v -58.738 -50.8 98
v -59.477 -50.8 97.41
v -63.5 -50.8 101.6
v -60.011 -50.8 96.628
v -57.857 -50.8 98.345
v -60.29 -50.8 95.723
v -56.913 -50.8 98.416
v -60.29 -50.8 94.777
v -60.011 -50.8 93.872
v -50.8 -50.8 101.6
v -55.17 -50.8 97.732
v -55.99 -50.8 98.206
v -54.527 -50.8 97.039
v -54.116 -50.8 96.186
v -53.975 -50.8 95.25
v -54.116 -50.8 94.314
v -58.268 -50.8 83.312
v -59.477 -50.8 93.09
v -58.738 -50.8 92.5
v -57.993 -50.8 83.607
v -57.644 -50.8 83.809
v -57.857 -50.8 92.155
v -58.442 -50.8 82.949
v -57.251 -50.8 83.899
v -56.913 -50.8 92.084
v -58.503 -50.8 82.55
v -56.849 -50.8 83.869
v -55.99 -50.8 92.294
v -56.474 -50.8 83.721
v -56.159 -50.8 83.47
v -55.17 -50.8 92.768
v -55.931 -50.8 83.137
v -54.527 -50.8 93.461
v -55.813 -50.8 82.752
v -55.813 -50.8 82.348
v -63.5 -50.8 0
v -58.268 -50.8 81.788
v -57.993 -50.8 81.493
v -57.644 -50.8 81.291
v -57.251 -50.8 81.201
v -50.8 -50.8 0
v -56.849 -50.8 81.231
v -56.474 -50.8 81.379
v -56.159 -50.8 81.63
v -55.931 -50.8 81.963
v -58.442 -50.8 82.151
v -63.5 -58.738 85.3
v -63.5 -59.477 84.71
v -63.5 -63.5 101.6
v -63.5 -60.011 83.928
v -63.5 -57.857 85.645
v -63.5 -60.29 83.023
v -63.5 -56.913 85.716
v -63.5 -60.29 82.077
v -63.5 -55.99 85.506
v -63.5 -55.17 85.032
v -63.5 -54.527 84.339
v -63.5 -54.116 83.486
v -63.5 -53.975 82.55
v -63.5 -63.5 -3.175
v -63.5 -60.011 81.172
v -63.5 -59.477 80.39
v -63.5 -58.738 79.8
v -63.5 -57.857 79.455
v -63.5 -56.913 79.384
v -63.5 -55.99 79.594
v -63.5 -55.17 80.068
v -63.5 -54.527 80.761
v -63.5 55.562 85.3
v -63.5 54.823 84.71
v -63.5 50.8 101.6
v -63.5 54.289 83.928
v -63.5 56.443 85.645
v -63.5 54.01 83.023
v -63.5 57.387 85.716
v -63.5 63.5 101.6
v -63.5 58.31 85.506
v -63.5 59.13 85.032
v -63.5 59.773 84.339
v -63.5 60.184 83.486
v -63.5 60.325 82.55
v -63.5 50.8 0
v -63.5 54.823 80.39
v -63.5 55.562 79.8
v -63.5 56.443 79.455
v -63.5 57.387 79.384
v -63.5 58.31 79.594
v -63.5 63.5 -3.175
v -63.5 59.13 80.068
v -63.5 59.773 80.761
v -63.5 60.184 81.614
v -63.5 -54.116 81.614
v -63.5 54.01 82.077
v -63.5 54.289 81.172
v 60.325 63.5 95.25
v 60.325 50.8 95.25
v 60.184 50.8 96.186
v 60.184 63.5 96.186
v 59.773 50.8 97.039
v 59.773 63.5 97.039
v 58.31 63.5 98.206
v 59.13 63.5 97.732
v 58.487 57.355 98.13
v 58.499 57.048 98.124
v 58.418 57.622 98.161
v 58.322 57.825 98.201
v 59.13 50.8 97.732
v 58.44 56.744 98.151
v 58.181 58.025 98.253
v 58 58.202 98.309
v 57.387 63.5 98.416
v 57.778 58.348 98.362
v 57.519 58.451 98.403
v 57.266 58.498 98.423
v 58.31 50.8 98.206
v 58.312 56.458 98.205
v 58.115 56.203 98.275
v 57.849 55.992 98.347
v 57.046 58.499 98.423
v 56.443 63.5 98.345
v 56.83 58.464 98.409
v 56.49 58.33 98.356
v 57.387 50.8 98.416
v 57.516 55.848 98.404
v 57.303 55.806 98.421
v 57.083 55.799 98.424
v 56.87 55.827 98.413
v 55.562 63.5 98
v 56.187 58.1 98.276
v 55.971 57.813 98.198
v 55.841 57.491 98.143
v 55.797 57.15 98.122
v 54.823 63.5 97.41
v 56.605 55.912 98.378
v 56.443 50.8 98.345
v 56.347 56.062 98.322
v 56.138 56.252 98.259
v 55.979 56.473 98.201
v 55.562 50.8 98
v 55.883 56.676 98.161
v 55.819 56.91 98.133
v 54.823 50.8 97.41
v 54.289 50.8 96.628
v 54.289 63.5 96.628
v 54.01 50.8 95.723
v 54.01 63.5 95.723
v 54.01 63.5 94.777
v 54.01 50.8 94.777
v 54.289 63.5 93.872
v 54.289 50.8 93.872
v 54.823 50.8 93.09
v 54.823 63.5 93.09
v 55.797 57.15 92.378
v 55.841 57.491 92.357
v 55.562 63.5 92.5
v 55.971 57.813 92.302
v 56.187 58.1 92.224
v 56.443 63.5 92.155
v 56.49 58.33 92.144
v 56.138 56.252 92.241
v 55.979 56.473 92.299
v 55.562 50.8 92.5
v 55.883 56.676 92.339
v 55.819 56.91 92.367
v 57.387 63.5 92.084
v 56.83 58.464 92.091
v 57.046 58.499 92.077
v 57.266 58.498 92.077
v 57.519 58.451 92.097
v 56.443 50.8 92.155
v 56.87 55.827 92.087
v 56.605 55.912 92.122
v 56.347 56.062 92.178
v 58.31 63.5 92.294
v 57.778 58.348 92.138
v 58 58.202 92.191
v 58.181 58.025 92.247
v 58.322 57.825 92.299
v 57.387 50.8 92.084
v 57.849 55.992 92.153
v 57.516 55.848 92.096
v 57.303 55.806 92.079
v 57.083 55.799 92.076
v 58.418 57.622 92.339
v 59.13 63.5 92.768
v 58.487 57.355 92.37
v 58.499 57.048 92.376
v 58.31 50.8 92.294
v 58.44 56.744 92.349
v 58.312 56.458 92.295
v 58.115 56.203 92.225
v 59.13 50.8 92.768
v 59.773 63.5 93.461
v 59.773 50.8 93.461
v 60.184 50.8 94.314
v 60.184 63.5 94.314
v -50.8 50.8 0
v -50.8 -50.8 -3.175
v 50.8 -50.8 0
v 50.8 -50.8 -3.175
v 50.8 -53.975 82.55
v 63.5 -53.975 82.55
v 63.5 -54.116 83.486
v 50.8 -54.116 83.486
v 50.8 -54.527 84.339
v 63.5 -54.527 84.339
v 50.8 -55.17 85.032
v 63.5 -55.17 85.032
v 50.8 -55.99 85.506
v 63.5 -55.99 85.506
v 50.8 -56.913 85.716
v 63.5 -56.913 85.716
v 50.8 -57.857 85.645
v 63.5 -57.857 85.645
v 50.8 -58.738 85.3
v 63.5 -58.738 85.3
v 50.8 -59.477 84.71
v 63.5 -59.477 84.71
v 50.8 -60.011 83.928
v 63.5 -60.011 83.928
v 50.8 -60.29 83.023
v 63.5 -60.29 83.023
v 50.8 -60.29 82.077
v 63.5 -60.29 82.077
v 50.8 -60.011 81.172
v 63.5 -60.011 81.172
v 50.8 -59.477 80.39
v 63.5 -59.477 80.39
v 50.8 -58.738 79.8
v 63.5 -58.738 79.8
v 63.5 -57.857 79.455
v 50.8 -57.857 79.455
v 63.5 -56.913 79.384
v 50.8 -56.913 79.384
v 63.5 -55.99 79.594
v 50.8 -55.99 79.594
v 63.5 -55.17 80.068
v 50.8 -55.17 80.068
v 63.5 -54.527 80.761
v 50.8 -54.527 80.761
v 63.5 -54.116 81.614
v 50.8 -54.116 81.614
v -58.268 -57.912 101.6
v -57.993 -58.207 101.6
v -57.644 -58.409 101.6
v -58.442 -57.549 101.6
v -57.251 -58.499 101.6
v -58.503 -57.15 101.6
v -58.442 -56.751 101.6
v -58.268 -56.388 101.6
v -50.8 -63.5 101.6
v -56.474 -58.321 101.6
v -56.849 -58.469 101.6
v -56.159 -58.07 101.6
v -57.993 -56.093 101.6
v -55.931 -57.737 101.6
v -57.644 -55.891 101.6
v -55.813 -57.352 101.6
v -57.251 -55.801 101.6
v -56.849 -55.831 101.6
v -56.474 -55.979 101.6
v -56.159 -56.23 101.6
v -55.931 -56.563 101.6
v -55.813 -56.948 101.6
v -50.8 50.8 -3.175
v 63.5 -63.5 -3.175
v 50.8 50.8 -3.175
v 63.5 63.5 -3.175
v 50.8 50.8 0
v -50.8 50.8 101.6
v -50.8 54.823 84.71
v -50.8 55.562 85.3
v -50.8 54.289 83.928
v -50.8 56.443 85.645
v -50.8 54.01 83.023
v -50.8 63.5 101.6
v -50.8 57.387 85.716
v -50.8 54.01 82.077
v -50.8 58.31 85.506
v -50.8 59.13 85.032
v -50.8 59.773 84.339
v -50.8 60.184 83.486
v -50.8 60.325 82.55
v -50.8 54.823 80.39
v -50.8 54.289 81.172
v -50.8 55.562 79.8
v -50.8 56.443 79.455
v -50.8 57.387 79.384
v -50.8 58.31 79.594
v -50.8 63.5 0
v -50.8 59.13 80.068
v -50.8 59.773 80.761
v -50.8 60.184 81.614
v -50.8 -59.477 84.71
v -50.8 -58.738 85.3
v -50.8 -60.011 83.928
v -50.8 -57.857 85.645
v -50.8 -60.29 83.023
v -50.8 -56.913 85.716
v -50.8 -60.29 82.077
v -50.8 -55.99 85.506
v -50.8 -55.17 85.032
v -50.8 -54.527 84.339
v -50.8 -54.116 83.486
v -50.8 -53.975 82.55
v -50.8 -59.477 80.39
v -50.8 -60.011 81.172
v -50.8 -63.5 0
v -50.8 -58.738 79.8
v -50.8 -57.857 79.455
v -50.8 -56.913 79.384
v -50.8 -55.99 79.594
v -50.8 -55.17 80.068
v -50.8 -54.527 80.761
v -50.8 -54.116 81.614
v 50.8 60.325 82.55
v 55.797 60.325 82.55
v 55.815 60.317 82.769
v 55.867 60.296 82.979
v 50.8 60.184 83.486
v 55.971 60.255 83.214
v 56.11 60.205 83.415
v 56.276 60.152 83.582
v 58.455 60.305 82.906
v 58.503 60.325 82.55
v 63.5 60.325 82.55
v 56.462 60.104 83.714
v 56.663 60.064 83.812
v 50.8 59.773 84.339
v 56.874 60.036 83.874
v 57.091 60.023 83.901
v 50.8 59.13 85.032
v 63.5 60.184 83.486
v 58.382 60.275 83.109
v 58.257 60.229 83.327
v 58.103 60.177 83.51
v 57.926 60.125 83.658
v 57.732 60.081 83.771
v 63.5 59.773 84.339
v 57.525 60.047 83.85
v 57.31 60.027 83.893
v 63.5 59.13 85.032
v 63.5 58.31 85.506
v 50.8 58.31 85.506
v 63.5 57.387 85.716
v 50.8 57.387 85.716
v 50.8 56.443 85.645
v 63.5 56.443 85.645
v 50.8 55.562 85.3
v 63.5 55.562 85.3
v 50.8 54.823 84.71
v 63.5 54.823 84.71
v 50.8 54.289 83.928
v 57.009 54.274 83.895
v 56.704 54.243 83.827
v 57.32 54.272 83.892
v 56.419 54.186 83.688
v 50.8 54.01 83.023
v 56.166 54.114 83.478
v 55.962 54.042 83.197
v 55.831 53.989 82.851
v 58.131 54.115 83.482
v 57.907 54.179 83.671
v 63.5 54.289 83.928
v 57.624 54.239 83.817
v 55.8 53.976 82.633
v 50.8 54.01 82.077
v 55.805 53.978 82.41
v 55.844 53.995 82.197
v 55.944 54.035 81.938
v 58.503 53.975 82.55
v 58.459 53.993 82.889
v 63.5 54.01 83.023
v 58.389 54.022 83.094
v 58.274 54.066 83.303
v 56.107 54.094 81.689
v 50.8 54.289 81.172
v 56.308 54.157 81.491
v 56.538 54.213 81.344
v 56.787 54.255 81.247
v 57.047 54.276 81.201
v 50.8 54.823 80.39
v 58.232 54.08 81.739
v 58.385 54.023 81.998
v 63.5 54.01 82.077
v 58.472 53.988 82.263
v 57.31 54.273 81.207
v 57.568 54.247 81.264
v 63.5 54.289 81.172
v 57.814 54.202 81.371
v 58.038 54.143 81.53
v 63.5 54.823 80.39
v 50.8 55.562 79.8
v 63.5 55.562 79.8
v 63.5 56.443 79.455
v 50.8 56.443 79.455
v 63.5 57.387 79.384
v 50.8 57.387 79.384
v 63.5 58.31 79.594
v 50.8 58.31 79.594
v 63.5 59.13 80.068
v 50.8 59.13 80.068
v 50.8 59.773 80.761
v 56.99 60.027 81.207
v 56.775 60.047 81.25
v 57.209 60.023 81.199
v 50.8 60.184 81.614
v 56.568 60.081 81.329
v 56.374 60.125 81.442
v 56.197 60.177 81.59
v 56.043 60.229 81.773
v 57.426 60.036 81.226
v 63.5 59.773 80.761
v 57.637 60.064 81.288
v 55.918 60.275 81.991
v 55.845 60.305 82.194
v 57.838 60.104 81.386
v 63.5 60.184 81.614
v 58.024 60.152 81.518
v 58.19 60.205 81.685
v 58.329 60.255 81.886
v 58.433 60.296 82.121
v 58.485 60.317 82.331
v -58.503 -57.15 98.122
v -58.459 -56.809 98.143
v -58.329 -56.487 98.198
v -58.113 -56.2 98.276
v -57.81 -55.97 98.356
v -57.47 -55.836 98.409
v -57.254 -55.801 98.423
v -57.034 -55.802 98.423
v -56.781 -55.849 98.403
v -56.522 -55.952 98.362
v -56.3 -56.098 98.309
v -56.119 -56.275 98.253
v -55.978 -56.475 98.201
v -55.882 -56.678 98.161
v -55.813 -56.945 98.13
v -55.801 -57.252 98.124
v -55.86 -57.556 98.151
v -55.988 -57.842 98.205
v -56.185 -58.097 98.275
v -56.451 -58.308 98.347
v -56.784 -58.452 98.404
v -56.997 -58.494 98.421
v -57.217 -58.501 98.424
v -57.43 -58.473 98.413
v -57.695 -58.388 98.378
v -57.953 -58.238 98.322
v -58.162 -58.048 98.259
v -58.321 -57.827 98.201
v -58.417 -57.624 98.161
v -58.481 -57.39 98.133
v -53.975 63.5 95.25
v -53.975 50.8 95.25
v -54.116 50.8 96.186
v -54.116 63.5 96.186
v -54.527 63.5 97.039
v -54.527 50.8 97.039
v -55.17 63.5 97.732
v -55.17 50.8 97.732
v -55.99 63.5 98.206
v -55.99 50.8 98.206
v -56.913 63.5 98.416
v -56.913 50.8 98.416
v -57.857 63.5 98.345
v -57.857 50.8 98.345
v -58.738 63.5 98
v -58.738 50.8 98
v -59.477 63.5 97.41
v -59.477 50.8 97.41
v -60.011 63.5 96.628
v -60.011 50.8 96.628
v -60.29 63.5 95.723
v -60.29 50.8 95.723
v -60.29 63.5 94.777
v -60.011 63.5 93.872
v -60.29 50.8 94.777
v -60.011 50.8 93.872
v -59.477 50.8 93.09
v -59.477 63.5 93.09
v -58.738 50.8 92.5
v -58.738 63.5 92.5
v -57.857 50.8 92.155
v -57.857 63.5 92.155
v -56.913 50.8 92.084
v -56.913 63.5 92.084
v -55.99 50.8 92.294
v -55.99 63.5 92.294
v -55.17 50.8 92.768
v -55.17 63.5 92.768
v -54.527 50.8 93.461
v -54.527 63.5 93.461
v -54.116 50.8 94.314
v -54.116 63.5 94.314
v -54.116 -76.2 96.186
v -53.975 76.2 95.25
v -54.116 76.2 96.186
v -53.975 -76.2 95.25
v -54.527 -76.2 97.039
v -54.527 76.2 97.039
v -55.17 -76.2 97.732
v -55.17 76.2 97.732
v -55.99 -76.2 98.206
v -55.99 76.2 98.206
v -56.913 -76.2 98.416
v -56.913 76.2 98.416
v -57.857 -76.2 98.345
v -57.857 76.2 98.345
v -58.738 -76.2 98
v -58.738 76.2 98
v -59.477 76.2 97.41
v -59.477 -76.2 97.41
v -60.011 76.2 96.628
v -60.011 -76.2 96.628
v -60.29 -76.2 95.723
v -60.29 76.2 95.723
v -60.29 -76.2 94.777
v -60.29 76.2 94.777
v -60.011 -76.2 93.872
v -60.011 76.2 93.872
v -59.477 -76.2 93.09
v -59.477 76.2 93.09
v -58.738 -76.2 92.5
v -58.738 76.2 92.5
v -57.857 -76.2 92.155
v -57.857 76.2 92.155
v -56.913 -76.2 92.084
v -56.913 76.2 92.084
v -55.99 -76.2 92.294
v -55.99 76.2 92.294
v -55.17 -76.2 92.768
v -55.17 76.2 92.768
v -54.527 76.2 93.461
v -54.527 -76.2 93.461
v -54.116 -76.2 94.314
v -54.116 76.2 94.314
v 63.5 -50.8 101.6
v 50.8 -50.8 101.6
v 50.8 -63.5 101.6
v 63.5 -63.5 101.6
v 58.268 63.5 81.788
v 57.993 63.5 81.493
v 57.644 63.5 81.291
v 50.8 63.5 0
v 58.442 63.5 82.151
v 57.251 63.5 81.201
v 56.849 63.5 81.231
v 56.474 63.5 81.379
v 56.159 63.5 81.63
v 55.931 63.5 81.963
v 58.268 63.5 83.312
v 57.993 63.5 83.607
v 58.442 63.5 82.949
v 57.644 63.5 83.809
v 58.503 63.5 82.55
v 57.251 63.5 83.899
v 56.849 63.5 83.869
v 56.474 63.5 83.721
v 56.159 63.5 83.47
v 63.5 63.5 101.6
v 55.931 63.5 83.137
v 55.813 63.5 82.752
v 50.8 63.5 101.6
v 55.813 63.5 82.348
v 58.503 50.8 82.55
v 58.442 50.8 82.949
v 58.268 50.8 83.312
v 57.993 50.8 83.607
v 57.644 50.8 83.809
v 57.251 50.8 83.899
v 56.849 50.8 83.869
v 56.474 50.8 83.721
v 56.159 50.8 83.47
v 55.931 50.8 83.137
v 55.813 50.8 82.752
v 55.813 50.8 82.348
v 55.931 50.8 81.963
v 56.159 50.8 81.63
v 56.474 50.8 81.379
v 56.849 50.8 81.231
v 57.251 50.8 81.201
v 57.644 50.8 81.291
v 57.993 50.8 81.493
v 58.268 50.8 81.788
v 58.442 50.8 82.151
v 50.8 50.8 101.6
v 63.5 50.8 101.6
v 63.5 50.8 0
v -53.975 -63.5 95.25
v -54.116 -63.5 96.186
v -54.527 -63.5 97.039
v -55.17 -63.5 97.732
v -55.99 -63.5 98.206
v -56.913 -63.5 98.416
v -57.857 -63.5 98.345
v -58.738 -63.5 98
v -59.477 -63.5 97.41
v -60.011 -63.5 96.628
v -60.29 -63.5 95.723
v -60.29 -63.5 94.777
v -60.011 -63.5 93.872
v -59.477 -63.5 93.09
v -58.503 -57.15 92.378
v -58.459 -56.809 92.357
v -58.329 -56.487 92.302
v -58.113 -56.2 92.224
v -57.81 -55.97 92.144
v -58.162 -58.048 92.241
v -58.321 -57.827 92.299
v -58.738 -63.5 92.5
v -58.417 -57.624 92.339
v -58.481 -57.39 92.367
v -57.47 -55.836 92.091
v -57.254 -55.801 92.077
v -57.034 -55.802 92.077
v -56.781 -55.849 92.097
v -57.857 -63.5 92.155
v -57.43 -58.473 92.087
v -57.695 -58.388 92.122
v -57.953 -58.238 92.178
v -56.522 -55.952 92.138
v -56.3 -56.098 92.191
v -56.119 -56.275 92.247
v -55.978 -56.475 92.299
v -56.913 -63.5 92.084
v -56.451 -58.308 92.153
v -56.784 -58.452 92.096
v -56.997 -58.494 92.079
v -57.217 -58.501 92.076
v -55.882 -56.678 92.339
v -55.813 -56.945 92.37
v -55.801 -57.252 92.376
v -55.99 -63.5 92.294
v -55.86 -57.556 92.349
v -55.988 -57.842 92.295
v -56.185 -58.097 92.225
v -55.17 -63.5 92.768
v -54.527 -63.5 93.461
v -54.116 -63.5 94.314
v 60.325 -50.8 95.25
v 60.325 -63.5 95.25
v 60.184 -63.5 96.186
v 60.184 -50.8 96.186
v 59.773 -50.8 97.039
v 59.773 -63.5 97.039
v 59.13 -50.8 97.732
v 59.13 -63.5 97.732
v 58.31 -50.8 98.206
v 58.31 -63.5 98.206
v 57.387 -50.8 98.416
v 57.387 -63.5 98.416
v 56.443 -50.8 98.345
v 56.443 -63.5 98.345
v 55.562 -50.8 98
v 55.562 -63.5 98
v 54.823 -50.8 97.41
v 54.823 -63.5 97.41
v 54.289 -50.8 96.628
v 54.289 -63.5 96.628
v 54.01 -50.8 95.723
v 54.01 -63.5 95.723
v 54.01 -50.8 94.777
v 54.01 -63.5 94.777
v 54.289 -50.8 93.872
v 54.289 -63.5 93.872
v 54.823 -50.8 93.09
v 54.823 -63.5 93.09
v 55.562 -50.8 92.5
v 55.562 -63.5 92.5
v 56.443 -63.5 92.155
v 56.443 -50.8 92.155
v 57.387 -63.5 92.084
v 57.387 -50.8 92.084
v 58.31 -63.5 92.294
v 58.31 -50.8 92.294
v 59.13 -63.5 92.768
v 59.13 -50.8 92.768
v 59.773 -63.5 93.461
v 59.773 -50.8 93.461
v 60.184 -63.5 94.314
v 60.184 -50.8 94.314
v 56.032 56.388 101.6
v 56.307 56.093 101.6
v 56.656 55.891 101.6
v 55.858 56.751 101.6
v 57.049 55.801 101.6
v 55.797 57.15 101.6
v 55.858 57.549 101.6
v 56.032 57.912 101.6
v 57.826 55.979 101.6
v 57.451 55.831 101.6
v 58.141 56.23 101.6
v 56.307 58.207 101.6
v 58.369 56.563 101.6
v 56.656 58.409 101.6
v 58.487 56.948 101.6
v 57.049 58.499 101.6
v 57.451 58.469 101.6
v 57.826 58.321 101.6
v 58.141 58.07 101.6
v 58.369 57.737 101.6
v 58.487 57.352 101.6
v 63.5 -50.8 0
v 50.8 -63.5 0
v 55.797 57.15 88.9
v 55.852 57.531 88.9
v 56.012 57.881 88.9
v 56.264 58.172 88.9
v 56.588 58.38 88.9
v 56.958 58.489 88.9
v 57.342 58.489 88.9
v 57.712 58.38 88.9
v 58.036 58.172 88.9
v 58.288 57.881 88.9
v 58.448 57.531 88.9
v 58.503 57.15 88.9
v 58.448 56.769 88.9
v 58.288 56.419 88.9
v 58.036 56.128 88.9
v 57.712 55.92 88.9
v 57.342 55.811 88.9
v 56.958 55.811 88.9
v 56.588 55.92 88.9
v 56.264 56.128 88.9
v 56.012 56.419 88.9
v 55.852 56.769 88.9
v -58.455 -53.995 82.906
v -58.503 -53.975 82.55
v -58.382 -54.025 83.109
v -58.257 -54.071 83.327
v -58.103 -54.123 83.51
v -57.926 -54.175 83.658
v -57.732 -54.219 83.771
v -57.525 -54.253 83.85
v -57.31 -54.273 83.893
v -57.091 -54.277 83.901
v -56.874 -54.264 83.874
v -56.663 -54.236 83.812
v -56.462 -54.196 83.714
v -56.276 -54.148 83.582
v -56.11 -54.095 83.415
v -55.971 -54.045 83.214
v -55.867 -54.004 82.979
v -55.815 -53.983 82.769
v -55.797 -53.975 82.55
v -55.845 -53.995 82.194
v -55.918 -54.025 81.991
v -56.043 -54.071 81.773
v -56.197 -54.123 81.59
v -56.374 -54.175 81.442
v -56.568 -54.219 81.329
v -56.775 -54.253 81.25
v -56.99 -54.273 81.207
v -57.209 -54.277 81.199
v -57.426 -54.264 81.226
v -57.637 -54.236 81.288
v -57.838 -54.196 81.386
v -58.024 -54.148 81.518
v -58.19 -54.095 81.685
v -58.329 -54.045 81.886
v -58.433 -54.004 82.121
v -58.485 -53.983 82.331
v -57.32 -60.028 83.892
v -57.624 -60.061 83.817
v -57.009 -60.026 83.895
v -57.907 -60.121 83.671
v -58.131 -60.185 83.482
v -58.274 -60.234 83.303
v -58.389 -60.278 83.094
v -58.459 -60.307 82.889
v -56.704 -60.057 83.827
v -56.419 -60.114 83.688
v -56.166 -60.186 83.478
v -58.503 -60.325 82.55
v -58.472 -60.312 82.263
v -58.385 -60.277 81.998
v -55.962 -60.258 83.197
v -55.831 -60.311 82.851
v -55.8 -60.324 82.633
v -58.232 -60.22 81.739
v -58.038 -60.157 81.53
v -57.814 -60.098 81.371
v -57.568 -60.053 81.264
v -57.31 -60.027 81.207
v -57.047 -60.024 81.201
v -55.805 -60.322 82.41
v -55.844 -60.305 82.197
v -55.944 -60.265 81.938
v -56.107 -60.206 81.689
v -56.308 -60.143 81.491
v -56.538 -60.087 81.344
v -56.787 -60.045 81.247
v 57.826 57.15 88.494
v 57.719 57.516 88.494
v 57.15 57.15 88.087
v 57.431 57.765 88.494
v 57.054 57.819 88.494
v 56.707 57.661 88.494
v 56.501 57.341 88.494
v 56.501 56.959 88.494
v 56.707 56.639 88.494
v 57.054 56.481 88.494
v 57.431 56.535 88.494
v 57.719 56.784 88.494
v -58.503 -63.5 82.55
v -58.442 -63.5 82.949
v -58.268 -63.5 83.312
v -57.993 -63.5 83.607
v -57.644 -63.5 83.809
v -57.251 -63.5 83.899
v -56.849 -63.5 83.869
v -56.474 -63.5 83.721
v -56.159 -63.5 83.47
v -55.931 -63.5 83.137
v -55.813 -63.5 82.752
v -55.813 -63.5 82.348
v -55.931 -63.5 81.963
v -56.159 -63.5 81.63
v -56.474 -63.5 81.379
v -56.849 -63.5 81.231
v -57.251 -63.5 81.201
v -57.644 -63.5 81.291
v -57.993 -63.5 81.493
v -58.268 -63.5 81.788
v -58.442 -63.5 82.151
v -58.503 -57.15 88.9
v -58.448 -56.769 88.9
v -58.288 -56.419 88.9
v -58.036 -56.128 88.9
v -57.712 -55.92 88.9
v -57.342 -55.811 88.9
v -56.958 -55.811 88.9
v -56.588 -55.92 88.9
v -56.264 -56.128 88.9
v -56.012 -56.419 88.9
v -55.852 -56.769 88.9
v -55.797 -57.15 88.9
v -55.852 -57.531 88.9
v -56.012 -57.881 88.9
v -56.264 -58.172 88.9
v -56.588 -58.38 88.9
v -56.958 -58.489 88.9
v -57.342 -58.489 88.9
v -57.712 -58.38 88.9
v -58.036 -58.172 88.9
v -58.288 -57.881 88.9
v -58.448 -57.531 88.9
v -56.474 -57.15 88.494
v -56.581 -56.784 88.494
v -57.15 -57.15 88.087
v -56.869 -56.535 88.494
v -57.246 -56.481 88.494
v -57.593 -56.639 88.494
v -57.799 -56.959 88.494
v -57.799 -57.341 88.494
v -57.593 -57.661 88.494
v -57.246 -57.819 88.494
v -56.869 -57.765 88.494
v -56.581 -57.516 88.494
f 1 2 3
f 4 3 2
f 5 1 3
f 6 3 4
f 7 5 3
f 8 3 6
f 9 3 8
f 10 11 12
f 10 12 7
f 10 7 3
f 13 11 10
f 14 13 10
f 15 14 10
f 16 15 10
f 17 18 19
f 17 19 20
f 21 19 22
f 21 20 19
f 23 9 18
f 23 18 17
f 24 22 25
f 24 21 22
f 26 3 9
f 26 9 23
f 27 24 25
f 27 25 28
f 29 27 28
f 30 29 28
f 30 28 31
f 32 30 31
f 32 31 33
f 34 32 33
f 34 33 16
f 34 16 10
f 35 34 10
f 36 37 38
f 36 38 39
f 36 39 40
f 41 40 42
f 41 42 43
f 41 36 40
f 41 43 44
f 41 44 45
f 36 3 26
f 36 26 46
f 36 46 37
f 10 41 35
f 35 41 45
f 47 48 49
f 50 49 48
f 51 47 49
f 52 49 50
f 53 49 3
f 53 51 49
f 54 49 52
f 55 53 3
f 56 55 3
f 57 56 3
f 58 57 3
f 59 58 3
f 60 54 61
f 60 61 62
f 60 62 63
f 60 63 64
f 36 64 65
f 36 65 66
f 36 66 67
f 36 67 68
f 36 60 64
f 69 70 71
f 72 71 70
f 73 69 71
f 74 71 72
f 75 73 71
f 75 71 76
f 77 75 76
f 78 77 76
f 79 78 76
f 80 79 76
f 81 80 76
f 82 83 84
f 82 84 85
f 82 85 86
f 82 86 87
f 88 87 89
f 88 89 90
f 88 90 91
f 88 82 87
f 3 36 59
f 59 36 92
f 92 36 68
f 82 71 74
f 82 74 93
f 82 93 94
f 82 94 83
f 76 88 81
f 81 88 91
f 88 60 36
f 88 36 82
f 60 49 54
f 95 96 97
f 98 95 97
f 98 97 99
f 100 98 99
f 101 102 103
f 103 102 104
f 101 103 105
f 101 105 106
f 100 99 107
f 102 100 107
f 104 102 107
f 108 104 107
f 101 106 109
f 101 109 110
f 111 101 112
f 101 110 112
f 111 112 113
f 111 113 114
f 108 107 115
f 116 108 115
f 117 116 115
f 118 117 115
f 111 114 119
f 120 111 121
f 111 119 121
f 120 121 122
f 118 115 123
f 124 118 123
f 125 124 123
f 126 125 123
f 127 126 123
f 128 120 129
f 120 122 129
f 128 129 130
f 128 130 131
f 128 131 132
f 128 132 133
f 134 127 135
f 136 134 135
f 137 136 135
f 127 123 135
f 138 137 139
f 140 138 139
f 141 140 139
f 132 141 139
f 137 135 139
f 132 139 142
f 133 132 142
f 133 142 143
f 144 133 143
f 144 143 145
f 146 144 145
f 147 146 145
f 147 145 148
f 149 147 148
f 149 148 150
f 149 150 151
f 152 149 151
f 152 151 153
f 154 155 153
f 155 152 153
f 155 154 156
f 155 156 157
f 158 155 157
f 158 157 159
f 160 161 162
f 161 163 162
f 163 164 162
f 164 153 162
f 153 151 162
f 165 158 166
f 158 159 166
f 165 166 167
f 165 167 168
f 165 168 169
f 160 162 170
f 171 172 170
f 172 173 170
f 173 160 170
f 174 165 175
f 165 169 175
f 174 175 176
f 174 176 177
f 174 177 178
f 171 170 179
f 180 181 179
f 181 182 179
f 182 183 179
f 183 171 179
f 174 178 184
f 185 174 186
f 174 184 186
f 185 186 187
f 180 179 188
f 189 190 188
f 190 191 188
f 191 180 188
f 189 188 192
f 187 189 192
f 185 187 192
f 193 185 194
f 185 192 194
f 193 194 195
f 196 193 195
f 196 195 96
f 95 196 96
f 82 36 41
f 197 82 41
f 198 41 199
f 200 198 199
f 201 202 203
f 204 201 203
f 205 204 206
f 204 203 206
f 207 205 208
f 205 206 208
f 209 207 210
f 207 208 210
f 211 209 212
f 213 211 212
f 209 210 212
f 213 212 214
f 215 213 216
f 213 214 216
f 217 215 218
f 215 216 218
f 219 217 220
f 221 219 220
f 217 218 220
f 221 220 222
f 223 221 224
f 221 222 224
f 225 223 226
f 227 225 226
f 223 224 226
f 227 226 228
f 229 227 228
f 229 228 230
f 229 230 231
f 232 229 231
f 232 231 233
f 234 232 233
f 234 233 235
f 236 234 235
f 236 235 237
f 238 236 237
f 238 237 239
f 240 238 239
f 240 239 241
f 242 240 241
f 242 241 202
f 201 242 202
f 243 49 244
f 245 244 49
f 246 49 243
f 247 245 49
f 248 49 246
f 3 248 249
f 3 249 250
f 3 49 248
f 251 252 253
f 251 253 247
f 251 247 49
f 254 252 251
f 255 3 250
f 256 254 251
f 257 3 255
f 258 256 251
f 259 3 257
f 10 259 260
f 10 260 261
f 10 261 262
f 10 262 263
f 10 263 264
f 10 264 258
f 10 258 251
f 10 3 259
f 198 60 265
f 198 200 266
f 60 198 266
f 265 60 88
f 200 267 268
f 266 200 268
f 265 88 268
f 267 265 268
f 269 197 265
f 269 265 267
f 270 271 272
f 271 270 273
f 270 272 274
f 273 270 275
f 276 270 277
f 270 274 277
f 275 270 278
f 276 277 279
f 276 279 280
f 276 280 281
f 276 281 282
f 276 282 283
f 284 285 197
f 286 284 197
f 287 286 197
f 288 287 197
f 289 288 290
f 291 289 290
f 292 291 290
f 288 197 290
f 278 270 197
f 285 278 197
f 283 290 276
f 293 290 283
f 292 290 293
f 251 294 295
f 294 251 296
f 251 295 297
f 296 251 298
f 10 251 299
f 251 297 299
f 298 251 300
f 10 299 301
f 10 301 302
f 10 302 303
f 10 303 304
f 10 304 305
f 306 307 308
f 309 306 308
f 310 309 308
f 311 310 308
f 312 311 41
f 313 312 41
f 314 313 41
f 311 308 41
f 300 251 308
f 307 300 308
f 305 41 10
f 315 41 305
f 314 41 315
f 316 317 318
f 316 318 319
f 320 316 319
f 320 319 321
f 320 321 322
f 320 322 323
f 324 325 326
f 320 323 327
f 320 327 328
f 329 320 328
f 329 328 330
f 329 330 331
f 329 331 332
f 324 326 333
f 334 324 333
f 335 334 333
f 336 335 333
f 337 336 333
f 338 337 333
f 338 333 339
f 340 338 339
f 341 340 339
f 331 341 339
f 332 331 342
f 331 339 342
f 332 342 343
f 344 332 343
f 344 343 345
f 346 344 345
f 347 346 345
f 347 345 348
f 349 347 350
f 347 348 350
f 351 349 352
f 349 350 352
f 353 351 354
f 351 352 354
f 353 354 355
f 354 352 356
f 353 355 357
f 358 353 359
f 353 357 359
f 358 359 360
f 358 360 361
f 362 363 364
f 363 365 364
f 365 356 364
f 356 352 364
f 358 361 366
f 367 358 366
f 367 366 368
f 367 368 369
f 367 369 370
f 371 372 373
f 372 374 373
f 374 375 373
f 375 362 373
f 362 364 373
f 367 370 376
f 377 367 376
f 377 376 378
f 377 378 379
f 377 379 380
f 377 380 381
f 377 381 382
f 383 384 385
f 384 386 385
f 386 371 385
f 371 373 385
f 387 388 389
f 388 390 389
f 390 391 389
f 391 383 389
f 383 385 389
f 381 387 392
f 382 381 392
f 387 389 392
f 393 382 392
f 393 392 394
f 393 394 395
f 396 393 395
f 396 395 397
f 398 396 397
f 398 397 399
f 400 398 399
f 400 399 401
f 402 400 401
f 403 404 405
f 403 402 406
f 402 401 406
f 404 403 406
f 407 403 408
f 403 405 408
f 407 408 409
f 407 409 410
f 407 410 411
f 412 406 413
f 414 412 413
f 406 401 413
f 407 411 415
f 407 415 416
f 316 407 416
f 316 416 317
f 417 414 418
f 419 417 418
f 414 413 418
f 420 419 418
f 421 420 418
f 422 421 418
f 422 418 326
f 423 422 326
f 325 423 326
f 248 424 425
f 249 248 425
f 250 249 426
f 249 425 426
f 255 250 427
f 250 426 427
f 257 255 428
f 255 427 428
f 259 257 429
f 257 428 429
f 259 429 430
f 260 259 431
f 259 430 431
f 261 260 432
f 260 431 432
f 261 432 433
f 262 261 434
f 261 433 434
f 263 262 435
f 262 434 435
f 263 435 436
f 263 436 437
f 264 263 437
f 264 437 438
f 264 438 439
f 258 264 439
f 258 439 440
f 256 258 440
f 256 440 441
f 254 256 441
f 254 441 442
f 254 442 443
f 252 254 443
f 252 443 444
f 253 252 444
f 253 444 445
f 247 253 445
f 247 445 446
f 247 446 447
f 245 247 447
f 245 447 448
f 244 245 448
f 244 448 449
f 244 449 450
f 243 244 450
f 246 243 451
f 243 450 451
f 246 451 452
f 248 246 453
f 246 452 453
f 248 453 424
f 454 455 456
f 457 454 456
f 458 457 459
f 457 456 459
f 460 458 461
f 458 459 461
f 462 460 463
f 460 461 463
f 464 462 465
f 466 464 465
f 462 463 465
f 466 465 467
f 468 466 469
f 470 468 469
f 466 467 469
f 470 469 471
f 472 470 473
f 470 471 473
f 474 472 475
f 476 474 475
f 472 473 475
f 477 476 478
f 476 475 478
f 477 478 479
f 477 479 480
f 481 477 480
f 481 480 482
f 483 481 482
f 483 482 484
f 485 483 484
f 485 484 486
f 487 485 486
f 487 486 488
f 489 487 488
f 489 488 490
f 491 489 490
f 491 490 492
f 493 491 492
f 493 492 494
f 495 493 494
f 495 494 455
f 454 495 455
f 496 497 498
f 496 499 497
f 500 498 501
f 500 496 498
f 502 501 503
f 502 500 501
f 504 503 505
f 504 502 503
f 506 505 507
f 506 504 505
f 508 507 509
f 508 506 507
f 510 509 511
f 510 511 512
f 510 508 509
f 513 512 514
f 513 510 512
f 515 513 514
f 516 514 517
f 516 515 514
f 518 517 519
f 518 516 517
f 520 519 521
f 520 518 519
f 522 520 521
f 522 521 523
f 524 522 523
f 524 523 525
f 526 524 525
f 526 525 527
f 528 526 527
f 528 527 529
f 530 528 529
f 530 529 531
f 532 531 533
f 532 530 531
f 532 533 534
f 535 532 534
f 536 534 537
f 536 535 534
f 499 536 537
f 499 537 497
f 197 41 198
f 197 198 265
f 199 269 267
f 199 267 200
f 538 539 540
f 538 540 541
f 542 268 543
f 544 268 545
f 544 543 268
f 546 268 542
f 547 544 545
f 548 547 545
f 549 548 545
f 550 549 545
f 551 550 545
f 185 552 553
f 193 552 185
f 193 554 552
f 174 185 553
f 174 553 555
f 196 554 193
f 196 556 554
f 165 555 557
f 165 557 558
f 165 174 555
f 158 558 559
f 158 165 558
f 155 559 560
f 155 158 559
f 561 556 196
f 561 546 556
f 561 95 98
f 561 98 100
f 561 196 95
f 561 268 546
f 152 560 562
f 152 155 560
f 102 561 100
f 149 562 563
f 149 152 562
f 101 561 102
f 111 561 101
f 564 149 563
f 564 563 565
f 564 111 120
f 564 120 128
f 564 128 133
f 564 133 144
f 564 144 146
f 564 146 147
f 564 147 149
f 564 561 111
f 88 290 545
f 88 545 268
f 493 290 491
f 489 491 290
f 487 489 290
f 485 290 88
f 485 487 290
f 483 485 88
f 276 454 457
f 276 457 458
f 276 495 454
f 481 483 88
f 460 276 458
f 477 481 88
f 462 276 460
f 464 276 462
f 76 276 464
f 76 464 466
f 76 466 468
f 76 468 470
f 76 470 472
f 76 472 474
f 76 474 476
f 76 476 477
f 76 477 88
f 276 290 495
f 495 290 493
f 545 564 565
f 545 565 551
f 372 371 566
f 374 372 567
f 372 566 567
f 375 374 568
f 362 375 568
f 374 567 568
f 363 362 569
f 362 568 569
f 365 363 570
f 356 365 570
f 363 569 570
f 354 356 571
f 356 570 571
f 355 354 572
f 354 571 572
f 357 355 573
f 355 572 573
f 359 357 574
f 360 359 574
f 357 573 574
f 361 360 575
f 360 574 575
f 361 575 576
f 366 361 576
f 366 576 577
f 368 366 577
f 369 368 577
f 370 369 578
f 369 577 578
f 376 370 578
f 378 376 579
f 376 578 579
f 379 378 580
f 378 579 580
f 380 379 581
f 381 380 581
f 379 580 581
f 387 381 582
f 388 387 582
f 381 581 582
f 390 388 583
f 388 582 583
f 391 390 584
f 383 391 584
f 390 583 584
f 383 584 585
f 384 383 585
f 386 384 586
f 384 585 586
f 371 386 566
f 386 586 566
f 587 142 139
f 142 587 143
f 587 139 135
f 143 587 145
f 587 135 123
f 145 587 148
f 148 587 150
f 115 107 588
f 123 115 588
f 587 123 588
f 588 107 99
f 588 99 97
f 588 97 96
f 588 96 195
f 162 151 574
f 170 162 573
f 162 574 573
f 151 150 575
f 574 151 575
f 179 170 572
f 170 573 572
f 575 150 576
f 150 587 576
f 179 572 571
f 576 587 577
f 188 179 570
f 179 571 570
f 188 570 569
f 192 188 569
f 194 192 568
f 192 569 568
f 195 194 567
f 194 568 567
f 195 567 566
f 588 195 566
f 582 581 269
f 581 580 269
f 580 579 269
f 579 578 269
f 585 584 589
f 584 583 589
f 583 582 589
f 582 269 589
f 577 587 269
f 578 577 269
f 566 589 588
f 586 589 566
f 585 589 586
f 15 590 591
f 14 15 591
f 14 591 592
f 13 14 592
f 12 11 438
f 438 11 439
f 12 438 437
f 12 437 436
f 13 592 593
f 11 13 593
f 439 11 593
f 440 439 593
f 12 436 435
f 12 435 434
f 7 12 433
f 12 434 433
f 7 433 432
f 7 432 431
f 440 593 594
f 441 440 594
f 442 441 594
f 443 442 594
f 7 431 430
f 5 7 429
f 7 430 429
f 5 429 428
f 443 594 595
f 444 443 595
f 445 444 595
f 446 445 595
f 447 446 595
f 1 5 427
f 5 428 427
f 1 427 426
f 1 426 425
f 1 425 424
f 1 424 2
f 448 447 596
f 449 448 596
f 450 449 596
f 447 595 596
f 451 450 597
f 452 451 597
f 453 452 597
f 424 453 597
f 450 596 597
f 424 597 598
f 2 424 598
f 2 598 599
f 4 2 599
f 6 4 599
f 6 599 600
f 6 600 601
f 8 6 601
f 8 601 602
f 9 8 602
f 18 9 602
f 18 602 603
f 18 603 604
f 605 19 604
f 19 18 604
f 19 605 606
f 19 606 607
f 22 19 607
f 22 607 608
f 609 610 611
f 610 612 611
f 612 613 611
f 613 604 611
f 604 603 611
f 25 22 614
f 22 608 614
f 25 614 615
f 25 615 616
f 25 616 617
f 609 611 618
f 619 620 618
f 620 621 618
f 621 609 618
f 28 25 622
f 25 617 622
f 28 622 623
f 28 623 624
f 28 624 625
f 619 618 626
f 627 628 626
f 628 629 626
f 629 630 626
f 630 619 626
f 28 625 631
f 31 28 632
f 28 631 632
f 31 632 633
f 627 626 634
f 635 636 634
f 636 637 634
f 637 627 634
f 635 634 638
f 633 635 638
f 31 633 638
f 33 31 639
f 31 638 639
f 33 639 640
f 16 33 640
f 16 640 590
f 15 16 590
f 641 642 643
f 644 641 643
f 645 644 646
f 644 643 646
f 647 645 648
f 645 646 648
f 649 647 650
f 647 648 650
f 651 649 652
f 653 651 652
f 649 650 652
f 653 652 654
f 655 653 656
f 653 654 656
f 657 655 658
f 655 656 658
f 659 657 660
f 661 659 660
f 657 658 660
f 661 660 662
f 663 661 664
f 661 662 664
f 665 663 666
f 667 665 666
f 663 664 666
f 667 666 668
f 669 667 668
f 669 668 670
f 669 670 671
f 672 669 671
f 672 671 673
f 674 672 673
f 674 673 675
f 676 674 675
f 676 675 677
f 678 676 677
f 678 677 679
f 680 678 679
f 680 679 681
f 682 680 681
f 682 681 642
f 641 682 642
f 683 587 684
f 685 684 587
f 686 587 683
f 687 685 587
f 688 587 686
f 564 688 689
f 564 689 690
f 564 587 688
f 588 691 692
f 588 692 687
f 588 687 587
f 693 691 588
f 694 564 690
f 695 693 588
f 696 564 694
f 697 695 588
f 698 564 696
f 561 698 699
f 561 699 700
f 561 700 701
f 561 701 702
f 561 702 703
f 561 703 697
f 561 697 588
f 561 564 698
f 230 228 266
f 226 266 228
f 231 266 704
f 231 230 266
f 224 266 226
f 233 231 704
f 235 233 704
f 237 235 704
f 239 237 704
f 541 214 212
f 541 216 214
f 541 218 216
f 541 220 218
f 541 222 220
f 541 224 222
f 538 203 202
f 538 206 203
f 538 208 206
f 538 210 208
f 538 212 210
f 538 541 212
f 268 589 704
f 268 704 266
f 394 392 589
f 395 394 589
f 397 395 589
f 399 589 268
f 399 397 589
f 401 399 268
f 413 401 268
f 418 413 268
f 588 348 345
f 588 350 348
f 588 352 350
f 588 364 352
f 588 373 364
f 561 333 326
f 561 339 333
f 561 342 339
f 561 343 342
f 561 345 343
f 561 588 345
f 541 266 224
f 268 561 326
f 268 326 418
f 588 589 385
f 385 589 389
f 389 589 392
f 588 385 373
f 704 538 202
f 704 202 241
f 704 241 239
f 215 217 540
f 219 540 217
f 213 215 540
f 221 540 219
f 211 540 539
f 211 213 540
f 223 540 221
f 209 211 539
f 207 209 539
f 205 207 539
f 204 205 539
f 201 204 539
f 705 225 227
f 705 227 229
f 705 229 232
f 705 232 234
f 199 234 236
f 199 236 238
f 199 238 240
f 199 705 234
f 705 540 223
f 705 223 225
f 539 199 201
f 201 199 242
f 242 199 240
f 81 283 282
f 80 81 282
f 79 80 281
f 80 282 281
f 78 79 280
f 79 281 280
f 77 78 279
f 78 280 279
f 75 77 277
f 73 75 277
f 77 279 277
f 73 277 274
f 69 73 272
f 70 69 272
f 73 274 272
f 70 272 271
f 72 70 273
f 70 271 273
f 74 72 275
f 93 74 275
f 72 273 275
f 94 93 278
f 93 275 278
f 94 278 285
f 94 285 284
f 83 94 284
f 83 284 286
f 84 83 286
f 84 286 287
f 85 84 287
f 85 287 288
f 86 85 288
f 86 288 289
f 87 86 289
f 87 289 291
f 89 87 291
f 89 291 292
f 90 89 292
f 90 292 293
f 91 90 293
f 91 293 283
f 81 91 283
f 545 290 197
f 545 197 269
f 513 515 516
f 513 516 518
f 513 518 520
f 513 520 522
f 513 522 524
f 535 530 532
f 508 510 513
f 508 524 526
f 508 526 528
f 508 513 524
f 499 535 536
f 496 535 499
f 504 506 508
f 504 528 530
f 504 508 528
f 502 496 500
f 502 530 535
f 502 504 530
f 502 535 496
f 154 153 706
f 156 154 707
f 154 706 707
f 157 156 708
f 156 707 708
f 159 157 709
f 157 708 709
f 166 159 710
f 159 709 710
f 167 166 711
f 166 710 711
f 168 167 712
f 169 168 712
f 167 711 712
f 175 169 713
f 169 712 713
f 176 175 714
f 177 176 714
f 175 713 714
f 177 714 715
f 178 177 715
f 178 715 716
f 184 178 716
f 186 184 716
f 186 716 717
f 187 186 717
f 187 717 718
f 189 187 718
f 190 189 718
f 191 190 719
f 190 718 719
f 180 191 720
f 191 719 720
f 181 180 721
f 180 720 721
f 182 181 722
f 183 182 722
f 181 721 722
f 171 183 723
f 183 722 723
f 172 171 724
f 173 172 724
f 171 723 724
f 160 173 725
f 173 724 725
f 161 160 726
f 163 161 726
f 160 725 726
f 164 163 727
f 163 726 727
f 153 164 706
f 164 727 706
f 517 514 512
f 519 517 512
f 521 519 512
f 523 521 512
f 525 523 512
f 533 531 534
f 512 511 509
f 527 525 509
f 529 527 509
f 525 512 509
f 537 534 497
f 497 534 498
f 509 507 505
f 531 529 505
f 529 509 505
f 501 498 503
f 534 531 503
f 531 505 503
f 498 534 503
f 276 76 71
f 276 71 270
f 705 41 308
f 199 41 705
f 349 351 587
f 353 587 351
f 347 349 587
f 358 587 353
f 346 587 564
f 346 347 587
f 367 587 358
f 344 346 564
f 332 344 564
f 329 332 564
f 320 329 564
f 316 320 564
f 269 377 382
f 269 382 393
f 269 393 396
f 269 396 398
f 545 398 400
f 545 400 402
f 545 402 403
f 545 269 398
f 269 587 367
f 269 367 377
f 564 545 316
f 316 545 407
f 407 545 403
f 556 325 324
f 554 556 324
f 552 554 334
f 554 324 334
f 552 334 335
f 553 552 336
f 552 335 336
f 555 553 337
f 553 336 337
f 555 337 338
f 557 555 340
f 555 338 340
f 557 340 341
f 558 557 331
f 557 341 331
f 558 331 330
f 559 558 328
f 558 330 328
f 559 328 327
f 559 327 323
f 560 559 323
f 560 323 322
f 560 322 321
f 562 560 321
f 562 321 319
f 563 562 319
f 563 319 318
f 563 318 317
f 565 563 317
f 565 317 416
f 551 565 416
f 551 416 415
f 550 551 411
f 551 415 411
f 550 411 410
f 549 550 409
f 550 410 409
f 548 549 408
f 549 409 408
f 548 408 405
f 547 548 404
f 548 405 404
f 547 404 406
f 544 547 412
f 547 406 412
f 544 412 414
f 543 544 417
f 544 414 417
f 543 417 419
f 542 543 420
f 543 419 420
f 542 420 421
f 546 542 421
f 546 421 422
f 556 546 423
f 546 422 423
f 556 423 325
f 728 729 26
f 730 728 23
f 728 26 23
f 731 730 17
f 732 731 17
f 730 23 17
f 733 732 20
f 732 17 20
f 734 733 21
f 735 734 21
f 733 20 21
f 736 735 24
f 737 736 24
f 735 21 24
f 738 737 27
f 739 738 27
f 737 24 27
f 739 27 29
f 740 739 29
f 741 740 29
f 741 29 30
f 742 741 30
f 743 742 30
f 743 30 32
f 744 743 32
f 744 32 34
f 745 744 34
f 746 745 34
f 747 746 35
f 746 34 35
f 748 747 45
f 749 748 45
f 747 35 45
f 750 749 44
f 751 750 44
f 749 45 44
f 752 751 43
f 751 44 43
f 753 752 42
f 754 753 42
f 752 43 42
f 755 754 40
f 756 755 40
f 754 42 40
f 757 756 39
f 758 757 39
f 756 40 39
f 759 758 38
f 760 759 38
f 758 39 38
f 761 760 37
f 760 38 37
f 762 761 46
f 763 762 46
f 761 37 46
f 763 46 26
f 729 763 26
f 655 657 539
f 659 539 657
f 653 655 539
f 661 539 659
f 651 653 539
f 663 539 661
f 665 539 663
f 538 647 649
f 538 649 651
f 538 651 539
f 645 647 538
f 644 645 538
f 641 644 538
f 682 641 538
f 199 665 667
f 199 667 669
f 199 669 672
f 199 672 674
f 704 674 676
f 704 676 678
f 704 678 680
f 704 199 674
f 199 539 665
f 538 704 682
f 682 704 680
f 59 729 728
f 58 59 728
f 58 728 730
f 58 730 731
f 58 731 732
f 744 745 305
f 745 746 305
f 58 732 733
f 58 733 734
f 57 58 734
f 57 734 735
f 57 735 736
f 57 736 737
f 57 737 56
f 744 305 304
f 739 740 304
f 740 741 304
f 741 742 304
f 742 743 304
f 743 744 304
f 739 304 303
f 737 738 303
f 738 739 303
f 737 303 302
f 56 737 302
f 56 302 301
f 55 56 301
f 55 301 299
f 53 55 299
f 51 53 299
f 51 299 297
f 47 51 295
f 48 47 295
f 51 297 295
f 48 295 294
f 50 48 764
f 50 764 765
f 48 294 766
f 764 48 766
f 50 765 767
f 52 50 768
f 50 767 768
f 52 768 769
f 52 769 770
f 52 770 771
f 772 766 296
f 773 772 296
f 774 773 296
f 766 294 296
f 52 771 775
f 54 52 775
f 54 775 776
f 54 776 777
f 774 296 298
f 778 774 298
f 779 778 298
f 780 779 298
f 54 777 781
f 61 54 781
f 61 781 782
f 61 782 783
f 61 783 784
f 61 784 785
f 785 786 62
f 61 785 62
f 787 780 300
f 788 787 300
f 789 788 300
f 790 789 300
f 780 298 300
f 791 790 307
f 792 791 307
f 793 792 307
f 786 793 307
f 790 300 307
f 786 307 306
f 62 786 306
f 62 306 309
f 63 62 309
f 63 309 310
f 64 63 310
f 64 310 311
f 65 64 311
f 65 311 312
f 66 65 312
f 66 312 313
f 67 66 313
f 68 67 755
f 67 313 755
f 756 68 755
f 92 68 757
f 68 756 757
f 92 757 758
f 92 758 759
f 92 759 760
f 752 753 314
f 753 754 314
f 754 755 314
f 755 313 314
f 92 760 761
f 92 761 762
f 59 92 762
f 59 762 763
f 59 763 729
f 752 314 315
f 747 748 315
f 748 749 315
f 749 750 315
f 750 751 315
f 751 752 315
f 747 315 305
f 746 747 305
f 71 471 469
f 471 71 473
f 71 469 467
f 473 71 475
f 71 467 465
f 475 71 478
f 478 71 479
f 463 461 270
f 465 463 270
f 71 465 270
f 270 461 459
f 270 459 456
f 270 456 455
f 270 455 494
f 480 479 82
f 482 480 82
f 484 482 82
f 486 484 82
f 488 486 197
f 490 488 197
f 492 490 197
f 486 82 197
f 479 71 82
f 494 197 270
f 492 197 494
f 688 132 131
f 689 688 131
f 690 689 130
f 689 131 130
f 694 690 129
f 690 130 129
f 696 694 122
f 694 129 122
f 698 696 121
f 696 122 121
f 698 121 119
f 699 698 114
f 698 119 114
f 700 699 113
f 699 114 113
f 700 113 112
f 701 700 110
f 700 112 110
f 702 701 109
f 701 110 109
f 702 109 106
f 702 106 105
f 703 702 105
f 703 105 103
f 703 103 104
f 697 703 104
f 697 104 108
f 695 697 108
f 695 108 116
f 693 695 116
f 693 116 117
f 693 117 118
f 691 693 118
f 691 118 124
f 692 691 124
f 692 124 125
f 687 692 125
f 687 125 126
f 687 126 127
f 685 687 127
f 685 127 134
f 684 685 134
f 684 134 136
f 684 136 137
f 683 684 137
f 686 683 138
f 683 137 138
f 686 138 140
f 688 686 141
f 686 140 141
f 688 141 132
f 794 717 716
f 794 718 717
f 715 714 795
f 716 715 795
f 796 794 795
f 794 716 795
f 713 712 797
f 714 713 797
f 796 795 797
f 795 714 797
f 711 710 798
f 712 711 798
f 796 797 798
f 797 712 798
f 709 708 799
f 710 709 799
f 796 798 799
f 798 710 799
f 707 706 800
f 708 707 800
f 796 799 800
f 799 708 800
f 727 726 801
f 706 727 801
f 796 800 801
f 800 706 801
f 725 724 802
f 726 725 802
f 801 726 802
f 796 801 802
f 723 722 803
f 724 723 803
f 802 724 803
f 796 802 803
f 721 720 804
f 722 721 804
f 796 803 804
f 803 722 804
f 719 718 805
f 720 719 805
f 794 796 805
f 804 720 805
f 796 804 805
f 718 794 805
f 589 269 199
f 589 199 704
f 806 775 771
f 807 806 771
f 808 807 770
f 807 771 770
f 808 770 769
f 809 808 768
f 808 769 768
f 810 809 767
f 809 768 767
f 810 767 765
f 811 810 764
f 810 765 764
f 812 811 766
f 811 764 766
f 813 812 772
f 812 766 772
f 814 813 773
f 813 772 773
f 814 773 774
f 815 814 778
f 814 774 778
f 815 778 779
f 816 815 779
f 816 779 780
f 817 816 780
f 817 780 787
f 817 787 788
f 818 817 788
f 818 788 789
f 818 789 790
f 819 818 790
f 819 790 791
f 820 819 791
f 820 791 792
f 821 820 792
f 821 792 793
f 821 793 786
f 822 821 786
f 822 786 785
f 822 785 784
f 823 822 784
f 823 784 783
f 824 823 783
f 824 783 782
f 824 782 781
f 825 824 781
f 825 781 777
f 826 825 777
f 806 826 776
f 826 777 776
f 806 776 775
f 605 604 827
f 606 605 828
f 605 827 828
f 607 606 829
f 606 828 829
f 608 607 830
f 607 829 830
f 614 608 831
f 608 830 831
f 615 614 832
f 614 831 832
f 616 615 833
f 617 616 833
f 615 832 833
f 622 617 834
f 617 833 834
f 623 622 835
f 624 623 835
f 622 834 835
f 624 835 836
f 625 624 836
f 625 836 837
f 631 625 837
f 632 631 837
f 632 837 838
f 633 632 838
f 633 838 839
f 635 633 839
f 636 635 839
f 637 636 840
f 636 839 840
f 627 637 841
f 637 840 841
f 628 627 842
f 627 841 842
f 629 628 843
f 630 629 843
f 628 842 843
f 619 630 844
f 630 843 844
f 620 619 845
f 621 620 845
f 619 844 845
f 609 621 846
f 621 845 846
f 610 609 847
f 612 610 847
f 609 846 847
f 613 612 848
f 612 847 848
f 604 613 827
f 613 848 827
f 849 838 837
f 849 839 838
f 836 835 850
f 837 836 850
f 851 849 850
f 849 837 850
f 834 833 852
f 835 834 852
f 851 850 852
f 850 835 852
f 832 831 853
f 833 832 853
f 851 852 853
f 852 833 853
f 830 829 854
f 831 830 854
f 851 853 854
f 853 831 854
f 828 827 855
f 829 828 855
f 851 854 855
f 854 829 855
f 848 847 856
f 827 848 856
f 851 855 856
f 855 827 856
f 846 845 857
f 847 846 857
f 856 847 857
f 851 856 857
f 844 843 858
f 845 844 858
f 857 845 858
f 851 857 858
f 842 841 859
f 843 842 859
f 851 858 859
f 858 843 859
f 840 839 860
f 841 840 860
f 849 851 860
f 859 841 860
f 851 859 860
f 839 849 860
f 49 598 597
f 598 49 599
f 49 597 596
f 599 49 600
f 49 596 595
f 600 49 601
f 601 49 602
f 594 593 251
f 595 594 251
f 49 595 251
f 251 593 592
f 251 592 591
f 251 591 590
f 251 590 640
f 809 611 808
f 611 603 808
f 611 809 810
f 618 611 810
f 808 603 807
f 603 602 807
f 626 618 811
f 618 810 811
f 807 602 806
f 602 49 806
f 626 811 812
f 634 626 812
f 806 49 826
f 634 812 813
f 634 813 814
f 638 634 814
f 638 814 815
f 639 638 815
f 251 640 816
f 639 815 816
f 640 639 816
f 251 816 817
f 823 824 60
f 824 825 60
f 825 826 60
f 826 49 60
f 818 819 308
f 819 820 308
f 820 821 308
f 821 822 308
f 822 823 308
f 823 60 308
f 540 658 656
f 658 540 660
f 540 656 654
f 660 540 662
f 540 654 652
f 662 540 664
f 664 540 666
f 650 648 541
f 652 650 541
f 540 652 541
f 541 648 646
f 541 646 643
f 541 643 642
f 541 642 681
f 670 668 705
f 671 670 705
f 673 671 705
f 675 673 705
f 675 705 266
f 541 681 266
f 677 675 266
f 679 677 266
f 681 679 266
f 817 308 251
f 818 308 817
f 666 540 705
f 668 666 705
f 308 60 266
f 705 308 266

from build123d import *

# Parameters (mm, degrees)
F0_W            = 12.7
F0_H            = 12.7
F0_H_2          = 101.6
F0_W_2          = 101.6
F1_DEPTH        = 3.175
F2_DEPTH        = 101.6
F3_R            = 3.175
F4_DEPTH        = 127.001
F5_R            = 3.175
F6_DEPTH        = 127.001
F10_D           = 2.7051
F10_DEPTH       = 12.7
F10_TIP         = 0.8126940303
F10_ON_F8_D     = 2.7051
F10_ON_F8_DEPTH = 12.7
F10_ON_F8_TIP   = 0.8126940303
F10_ON_F9_D     = 2.7051
F10_ON_F9_DEPTH = 12.7
F10_ON_F9_TIP   = 0.8126940303
F11_R           = 3.175
F12_DEPTH       = 12.7
F12_DEPTH_BACK  = 139.7


with BuildPart() as f1:
    # F0 (on Top) → F1 (new body)
    with BuildSketch(Plane.XY):
        with Locations((-57.15, -57.15)):
            Rectangle(F0_W, F0_H)
        with Locations((-57.15, 0)):
            Rectangle(F0_W, F0_H_2)
        with Locations((-57.15, 57.15)):
            Rectangle(F0_W, F0_H)
        with Locations((0, 57.15)):
            Rectangle(F0_W_2, F0_H)
        with Locations((57.15, 57.15)):
            Rectangle(F0_W, F0_H)
        with Locations((57.15, 0)):
            Rectangle(F0_W, F0_H_2)
        with Locations((57.15, -57.15)):
            Rectangle(F0_W, F0_H)
        with Locations((0, -57.15)):
            Rectangle(F0_W_2, F0_H)
    extrude(amount=-F1_DEPTH)

    # F0 (on Top) → F2 (join)
    with BuildSketch(Plane.XY):
        with Locations((-57.15, -57.15)):
            Rectangle(F0_W, F0_H)
        with Locations((-57.15, 57.15)):
            Rectangle(F0_W, F0_H)
        with Locations((57.15, 57.15)):
            Rectangle(F0_W, F0_H)
        with Locations((57.15, -57.15)):
            Rectangle(F0_W, F0_H)
    extrude(amount=F2_DEPTH)

    # F3 (on face) → F4 (cut, through all)
    with BuildSketch(Plane.XZ.offset(63.5)):
        with Locations((-57.15, 95.25)):
            Circle(F3_R)
        with Locations((57.15, 95.25)):
            Circle(F3_R)
    extrude(amount=-F4_DEPTH, mode=Mode.SUBTRACT)

    # F5 (on face) → F6 (cut, through all)
    with BuildSketch(Plane.YZ.offset(63.5)):
        with Locations((-57.15, 82.55)):
            Circle(F5_R)
        with Locations((57.15, 82.55)):
            Circle(F5_R)
    extrude(amount=-F6_DEPTH, mode=Mode.SUBTRACT)

    # F10
    with Locations(Plane.XY.offset(101.6)):
        with Locations((-57.15, -57.15), (57.15, 57.15)):
            Hole(F10_D / 2, depth=F10_DEPTH)
            with Locations((0, 0, -(F10_DEPTH + F10_TIP / 2))):  # 118° drill point
                Cone(0, F10_D / 2, F10_TIP, mode=Mode.SUBTRACT)

    # F10 on F8
    with Locations(Plane.XZ.offset(63.5)):
        with Locations((-57.15, 82.55)):
            Hole(F10_ON_F8_D / 2, depth=F10_ON_F8_DEPTH)
            with Locations((0, 0, -(F10_ON_F8_DEPTH + F10_ON_F8_TIP / 2))):  # 118° drill point
                Cone(0, F10_ON_F8_D / 2, F10_ON_F8_TIP, mode=Mode.SUBTRACT)

    # F10 on F9
    with Locations(Plane(origin=(0, 63.5, 0), x_dir=(-1, 0, 0), z_dir=(0, 1, 0))):
        with Locations((-57.15, 82.55)):
            Hole(F10_ON_F9_D / 2, depth=F10_ON_F9_DEPTH)
            with Locations((0, 0, -(F10_ON_F9_DEPTH + F10_ON_F9_TIP / 2))):  # 118° drill point
                Cone(0, F10_ON_F9_D / 2, F10_ON_F9_TIP, mode=Mode.SUBTRACT)


with BuildPart() as f12:
    # F11 (on face) → F12 (new body, two sides)
    with BuildSketch(Plane.XZ.offset(63.5)) as f12_sk:
        with Locations((-57.15, 95.25)):
            Circle(F11_R)
    extrude(amount=F12_DEPTH)
    extrude(f12_sk.sketch, amount=-F12_DEPTH_BACK)


solid = Compound([f1.part, f12.part])
